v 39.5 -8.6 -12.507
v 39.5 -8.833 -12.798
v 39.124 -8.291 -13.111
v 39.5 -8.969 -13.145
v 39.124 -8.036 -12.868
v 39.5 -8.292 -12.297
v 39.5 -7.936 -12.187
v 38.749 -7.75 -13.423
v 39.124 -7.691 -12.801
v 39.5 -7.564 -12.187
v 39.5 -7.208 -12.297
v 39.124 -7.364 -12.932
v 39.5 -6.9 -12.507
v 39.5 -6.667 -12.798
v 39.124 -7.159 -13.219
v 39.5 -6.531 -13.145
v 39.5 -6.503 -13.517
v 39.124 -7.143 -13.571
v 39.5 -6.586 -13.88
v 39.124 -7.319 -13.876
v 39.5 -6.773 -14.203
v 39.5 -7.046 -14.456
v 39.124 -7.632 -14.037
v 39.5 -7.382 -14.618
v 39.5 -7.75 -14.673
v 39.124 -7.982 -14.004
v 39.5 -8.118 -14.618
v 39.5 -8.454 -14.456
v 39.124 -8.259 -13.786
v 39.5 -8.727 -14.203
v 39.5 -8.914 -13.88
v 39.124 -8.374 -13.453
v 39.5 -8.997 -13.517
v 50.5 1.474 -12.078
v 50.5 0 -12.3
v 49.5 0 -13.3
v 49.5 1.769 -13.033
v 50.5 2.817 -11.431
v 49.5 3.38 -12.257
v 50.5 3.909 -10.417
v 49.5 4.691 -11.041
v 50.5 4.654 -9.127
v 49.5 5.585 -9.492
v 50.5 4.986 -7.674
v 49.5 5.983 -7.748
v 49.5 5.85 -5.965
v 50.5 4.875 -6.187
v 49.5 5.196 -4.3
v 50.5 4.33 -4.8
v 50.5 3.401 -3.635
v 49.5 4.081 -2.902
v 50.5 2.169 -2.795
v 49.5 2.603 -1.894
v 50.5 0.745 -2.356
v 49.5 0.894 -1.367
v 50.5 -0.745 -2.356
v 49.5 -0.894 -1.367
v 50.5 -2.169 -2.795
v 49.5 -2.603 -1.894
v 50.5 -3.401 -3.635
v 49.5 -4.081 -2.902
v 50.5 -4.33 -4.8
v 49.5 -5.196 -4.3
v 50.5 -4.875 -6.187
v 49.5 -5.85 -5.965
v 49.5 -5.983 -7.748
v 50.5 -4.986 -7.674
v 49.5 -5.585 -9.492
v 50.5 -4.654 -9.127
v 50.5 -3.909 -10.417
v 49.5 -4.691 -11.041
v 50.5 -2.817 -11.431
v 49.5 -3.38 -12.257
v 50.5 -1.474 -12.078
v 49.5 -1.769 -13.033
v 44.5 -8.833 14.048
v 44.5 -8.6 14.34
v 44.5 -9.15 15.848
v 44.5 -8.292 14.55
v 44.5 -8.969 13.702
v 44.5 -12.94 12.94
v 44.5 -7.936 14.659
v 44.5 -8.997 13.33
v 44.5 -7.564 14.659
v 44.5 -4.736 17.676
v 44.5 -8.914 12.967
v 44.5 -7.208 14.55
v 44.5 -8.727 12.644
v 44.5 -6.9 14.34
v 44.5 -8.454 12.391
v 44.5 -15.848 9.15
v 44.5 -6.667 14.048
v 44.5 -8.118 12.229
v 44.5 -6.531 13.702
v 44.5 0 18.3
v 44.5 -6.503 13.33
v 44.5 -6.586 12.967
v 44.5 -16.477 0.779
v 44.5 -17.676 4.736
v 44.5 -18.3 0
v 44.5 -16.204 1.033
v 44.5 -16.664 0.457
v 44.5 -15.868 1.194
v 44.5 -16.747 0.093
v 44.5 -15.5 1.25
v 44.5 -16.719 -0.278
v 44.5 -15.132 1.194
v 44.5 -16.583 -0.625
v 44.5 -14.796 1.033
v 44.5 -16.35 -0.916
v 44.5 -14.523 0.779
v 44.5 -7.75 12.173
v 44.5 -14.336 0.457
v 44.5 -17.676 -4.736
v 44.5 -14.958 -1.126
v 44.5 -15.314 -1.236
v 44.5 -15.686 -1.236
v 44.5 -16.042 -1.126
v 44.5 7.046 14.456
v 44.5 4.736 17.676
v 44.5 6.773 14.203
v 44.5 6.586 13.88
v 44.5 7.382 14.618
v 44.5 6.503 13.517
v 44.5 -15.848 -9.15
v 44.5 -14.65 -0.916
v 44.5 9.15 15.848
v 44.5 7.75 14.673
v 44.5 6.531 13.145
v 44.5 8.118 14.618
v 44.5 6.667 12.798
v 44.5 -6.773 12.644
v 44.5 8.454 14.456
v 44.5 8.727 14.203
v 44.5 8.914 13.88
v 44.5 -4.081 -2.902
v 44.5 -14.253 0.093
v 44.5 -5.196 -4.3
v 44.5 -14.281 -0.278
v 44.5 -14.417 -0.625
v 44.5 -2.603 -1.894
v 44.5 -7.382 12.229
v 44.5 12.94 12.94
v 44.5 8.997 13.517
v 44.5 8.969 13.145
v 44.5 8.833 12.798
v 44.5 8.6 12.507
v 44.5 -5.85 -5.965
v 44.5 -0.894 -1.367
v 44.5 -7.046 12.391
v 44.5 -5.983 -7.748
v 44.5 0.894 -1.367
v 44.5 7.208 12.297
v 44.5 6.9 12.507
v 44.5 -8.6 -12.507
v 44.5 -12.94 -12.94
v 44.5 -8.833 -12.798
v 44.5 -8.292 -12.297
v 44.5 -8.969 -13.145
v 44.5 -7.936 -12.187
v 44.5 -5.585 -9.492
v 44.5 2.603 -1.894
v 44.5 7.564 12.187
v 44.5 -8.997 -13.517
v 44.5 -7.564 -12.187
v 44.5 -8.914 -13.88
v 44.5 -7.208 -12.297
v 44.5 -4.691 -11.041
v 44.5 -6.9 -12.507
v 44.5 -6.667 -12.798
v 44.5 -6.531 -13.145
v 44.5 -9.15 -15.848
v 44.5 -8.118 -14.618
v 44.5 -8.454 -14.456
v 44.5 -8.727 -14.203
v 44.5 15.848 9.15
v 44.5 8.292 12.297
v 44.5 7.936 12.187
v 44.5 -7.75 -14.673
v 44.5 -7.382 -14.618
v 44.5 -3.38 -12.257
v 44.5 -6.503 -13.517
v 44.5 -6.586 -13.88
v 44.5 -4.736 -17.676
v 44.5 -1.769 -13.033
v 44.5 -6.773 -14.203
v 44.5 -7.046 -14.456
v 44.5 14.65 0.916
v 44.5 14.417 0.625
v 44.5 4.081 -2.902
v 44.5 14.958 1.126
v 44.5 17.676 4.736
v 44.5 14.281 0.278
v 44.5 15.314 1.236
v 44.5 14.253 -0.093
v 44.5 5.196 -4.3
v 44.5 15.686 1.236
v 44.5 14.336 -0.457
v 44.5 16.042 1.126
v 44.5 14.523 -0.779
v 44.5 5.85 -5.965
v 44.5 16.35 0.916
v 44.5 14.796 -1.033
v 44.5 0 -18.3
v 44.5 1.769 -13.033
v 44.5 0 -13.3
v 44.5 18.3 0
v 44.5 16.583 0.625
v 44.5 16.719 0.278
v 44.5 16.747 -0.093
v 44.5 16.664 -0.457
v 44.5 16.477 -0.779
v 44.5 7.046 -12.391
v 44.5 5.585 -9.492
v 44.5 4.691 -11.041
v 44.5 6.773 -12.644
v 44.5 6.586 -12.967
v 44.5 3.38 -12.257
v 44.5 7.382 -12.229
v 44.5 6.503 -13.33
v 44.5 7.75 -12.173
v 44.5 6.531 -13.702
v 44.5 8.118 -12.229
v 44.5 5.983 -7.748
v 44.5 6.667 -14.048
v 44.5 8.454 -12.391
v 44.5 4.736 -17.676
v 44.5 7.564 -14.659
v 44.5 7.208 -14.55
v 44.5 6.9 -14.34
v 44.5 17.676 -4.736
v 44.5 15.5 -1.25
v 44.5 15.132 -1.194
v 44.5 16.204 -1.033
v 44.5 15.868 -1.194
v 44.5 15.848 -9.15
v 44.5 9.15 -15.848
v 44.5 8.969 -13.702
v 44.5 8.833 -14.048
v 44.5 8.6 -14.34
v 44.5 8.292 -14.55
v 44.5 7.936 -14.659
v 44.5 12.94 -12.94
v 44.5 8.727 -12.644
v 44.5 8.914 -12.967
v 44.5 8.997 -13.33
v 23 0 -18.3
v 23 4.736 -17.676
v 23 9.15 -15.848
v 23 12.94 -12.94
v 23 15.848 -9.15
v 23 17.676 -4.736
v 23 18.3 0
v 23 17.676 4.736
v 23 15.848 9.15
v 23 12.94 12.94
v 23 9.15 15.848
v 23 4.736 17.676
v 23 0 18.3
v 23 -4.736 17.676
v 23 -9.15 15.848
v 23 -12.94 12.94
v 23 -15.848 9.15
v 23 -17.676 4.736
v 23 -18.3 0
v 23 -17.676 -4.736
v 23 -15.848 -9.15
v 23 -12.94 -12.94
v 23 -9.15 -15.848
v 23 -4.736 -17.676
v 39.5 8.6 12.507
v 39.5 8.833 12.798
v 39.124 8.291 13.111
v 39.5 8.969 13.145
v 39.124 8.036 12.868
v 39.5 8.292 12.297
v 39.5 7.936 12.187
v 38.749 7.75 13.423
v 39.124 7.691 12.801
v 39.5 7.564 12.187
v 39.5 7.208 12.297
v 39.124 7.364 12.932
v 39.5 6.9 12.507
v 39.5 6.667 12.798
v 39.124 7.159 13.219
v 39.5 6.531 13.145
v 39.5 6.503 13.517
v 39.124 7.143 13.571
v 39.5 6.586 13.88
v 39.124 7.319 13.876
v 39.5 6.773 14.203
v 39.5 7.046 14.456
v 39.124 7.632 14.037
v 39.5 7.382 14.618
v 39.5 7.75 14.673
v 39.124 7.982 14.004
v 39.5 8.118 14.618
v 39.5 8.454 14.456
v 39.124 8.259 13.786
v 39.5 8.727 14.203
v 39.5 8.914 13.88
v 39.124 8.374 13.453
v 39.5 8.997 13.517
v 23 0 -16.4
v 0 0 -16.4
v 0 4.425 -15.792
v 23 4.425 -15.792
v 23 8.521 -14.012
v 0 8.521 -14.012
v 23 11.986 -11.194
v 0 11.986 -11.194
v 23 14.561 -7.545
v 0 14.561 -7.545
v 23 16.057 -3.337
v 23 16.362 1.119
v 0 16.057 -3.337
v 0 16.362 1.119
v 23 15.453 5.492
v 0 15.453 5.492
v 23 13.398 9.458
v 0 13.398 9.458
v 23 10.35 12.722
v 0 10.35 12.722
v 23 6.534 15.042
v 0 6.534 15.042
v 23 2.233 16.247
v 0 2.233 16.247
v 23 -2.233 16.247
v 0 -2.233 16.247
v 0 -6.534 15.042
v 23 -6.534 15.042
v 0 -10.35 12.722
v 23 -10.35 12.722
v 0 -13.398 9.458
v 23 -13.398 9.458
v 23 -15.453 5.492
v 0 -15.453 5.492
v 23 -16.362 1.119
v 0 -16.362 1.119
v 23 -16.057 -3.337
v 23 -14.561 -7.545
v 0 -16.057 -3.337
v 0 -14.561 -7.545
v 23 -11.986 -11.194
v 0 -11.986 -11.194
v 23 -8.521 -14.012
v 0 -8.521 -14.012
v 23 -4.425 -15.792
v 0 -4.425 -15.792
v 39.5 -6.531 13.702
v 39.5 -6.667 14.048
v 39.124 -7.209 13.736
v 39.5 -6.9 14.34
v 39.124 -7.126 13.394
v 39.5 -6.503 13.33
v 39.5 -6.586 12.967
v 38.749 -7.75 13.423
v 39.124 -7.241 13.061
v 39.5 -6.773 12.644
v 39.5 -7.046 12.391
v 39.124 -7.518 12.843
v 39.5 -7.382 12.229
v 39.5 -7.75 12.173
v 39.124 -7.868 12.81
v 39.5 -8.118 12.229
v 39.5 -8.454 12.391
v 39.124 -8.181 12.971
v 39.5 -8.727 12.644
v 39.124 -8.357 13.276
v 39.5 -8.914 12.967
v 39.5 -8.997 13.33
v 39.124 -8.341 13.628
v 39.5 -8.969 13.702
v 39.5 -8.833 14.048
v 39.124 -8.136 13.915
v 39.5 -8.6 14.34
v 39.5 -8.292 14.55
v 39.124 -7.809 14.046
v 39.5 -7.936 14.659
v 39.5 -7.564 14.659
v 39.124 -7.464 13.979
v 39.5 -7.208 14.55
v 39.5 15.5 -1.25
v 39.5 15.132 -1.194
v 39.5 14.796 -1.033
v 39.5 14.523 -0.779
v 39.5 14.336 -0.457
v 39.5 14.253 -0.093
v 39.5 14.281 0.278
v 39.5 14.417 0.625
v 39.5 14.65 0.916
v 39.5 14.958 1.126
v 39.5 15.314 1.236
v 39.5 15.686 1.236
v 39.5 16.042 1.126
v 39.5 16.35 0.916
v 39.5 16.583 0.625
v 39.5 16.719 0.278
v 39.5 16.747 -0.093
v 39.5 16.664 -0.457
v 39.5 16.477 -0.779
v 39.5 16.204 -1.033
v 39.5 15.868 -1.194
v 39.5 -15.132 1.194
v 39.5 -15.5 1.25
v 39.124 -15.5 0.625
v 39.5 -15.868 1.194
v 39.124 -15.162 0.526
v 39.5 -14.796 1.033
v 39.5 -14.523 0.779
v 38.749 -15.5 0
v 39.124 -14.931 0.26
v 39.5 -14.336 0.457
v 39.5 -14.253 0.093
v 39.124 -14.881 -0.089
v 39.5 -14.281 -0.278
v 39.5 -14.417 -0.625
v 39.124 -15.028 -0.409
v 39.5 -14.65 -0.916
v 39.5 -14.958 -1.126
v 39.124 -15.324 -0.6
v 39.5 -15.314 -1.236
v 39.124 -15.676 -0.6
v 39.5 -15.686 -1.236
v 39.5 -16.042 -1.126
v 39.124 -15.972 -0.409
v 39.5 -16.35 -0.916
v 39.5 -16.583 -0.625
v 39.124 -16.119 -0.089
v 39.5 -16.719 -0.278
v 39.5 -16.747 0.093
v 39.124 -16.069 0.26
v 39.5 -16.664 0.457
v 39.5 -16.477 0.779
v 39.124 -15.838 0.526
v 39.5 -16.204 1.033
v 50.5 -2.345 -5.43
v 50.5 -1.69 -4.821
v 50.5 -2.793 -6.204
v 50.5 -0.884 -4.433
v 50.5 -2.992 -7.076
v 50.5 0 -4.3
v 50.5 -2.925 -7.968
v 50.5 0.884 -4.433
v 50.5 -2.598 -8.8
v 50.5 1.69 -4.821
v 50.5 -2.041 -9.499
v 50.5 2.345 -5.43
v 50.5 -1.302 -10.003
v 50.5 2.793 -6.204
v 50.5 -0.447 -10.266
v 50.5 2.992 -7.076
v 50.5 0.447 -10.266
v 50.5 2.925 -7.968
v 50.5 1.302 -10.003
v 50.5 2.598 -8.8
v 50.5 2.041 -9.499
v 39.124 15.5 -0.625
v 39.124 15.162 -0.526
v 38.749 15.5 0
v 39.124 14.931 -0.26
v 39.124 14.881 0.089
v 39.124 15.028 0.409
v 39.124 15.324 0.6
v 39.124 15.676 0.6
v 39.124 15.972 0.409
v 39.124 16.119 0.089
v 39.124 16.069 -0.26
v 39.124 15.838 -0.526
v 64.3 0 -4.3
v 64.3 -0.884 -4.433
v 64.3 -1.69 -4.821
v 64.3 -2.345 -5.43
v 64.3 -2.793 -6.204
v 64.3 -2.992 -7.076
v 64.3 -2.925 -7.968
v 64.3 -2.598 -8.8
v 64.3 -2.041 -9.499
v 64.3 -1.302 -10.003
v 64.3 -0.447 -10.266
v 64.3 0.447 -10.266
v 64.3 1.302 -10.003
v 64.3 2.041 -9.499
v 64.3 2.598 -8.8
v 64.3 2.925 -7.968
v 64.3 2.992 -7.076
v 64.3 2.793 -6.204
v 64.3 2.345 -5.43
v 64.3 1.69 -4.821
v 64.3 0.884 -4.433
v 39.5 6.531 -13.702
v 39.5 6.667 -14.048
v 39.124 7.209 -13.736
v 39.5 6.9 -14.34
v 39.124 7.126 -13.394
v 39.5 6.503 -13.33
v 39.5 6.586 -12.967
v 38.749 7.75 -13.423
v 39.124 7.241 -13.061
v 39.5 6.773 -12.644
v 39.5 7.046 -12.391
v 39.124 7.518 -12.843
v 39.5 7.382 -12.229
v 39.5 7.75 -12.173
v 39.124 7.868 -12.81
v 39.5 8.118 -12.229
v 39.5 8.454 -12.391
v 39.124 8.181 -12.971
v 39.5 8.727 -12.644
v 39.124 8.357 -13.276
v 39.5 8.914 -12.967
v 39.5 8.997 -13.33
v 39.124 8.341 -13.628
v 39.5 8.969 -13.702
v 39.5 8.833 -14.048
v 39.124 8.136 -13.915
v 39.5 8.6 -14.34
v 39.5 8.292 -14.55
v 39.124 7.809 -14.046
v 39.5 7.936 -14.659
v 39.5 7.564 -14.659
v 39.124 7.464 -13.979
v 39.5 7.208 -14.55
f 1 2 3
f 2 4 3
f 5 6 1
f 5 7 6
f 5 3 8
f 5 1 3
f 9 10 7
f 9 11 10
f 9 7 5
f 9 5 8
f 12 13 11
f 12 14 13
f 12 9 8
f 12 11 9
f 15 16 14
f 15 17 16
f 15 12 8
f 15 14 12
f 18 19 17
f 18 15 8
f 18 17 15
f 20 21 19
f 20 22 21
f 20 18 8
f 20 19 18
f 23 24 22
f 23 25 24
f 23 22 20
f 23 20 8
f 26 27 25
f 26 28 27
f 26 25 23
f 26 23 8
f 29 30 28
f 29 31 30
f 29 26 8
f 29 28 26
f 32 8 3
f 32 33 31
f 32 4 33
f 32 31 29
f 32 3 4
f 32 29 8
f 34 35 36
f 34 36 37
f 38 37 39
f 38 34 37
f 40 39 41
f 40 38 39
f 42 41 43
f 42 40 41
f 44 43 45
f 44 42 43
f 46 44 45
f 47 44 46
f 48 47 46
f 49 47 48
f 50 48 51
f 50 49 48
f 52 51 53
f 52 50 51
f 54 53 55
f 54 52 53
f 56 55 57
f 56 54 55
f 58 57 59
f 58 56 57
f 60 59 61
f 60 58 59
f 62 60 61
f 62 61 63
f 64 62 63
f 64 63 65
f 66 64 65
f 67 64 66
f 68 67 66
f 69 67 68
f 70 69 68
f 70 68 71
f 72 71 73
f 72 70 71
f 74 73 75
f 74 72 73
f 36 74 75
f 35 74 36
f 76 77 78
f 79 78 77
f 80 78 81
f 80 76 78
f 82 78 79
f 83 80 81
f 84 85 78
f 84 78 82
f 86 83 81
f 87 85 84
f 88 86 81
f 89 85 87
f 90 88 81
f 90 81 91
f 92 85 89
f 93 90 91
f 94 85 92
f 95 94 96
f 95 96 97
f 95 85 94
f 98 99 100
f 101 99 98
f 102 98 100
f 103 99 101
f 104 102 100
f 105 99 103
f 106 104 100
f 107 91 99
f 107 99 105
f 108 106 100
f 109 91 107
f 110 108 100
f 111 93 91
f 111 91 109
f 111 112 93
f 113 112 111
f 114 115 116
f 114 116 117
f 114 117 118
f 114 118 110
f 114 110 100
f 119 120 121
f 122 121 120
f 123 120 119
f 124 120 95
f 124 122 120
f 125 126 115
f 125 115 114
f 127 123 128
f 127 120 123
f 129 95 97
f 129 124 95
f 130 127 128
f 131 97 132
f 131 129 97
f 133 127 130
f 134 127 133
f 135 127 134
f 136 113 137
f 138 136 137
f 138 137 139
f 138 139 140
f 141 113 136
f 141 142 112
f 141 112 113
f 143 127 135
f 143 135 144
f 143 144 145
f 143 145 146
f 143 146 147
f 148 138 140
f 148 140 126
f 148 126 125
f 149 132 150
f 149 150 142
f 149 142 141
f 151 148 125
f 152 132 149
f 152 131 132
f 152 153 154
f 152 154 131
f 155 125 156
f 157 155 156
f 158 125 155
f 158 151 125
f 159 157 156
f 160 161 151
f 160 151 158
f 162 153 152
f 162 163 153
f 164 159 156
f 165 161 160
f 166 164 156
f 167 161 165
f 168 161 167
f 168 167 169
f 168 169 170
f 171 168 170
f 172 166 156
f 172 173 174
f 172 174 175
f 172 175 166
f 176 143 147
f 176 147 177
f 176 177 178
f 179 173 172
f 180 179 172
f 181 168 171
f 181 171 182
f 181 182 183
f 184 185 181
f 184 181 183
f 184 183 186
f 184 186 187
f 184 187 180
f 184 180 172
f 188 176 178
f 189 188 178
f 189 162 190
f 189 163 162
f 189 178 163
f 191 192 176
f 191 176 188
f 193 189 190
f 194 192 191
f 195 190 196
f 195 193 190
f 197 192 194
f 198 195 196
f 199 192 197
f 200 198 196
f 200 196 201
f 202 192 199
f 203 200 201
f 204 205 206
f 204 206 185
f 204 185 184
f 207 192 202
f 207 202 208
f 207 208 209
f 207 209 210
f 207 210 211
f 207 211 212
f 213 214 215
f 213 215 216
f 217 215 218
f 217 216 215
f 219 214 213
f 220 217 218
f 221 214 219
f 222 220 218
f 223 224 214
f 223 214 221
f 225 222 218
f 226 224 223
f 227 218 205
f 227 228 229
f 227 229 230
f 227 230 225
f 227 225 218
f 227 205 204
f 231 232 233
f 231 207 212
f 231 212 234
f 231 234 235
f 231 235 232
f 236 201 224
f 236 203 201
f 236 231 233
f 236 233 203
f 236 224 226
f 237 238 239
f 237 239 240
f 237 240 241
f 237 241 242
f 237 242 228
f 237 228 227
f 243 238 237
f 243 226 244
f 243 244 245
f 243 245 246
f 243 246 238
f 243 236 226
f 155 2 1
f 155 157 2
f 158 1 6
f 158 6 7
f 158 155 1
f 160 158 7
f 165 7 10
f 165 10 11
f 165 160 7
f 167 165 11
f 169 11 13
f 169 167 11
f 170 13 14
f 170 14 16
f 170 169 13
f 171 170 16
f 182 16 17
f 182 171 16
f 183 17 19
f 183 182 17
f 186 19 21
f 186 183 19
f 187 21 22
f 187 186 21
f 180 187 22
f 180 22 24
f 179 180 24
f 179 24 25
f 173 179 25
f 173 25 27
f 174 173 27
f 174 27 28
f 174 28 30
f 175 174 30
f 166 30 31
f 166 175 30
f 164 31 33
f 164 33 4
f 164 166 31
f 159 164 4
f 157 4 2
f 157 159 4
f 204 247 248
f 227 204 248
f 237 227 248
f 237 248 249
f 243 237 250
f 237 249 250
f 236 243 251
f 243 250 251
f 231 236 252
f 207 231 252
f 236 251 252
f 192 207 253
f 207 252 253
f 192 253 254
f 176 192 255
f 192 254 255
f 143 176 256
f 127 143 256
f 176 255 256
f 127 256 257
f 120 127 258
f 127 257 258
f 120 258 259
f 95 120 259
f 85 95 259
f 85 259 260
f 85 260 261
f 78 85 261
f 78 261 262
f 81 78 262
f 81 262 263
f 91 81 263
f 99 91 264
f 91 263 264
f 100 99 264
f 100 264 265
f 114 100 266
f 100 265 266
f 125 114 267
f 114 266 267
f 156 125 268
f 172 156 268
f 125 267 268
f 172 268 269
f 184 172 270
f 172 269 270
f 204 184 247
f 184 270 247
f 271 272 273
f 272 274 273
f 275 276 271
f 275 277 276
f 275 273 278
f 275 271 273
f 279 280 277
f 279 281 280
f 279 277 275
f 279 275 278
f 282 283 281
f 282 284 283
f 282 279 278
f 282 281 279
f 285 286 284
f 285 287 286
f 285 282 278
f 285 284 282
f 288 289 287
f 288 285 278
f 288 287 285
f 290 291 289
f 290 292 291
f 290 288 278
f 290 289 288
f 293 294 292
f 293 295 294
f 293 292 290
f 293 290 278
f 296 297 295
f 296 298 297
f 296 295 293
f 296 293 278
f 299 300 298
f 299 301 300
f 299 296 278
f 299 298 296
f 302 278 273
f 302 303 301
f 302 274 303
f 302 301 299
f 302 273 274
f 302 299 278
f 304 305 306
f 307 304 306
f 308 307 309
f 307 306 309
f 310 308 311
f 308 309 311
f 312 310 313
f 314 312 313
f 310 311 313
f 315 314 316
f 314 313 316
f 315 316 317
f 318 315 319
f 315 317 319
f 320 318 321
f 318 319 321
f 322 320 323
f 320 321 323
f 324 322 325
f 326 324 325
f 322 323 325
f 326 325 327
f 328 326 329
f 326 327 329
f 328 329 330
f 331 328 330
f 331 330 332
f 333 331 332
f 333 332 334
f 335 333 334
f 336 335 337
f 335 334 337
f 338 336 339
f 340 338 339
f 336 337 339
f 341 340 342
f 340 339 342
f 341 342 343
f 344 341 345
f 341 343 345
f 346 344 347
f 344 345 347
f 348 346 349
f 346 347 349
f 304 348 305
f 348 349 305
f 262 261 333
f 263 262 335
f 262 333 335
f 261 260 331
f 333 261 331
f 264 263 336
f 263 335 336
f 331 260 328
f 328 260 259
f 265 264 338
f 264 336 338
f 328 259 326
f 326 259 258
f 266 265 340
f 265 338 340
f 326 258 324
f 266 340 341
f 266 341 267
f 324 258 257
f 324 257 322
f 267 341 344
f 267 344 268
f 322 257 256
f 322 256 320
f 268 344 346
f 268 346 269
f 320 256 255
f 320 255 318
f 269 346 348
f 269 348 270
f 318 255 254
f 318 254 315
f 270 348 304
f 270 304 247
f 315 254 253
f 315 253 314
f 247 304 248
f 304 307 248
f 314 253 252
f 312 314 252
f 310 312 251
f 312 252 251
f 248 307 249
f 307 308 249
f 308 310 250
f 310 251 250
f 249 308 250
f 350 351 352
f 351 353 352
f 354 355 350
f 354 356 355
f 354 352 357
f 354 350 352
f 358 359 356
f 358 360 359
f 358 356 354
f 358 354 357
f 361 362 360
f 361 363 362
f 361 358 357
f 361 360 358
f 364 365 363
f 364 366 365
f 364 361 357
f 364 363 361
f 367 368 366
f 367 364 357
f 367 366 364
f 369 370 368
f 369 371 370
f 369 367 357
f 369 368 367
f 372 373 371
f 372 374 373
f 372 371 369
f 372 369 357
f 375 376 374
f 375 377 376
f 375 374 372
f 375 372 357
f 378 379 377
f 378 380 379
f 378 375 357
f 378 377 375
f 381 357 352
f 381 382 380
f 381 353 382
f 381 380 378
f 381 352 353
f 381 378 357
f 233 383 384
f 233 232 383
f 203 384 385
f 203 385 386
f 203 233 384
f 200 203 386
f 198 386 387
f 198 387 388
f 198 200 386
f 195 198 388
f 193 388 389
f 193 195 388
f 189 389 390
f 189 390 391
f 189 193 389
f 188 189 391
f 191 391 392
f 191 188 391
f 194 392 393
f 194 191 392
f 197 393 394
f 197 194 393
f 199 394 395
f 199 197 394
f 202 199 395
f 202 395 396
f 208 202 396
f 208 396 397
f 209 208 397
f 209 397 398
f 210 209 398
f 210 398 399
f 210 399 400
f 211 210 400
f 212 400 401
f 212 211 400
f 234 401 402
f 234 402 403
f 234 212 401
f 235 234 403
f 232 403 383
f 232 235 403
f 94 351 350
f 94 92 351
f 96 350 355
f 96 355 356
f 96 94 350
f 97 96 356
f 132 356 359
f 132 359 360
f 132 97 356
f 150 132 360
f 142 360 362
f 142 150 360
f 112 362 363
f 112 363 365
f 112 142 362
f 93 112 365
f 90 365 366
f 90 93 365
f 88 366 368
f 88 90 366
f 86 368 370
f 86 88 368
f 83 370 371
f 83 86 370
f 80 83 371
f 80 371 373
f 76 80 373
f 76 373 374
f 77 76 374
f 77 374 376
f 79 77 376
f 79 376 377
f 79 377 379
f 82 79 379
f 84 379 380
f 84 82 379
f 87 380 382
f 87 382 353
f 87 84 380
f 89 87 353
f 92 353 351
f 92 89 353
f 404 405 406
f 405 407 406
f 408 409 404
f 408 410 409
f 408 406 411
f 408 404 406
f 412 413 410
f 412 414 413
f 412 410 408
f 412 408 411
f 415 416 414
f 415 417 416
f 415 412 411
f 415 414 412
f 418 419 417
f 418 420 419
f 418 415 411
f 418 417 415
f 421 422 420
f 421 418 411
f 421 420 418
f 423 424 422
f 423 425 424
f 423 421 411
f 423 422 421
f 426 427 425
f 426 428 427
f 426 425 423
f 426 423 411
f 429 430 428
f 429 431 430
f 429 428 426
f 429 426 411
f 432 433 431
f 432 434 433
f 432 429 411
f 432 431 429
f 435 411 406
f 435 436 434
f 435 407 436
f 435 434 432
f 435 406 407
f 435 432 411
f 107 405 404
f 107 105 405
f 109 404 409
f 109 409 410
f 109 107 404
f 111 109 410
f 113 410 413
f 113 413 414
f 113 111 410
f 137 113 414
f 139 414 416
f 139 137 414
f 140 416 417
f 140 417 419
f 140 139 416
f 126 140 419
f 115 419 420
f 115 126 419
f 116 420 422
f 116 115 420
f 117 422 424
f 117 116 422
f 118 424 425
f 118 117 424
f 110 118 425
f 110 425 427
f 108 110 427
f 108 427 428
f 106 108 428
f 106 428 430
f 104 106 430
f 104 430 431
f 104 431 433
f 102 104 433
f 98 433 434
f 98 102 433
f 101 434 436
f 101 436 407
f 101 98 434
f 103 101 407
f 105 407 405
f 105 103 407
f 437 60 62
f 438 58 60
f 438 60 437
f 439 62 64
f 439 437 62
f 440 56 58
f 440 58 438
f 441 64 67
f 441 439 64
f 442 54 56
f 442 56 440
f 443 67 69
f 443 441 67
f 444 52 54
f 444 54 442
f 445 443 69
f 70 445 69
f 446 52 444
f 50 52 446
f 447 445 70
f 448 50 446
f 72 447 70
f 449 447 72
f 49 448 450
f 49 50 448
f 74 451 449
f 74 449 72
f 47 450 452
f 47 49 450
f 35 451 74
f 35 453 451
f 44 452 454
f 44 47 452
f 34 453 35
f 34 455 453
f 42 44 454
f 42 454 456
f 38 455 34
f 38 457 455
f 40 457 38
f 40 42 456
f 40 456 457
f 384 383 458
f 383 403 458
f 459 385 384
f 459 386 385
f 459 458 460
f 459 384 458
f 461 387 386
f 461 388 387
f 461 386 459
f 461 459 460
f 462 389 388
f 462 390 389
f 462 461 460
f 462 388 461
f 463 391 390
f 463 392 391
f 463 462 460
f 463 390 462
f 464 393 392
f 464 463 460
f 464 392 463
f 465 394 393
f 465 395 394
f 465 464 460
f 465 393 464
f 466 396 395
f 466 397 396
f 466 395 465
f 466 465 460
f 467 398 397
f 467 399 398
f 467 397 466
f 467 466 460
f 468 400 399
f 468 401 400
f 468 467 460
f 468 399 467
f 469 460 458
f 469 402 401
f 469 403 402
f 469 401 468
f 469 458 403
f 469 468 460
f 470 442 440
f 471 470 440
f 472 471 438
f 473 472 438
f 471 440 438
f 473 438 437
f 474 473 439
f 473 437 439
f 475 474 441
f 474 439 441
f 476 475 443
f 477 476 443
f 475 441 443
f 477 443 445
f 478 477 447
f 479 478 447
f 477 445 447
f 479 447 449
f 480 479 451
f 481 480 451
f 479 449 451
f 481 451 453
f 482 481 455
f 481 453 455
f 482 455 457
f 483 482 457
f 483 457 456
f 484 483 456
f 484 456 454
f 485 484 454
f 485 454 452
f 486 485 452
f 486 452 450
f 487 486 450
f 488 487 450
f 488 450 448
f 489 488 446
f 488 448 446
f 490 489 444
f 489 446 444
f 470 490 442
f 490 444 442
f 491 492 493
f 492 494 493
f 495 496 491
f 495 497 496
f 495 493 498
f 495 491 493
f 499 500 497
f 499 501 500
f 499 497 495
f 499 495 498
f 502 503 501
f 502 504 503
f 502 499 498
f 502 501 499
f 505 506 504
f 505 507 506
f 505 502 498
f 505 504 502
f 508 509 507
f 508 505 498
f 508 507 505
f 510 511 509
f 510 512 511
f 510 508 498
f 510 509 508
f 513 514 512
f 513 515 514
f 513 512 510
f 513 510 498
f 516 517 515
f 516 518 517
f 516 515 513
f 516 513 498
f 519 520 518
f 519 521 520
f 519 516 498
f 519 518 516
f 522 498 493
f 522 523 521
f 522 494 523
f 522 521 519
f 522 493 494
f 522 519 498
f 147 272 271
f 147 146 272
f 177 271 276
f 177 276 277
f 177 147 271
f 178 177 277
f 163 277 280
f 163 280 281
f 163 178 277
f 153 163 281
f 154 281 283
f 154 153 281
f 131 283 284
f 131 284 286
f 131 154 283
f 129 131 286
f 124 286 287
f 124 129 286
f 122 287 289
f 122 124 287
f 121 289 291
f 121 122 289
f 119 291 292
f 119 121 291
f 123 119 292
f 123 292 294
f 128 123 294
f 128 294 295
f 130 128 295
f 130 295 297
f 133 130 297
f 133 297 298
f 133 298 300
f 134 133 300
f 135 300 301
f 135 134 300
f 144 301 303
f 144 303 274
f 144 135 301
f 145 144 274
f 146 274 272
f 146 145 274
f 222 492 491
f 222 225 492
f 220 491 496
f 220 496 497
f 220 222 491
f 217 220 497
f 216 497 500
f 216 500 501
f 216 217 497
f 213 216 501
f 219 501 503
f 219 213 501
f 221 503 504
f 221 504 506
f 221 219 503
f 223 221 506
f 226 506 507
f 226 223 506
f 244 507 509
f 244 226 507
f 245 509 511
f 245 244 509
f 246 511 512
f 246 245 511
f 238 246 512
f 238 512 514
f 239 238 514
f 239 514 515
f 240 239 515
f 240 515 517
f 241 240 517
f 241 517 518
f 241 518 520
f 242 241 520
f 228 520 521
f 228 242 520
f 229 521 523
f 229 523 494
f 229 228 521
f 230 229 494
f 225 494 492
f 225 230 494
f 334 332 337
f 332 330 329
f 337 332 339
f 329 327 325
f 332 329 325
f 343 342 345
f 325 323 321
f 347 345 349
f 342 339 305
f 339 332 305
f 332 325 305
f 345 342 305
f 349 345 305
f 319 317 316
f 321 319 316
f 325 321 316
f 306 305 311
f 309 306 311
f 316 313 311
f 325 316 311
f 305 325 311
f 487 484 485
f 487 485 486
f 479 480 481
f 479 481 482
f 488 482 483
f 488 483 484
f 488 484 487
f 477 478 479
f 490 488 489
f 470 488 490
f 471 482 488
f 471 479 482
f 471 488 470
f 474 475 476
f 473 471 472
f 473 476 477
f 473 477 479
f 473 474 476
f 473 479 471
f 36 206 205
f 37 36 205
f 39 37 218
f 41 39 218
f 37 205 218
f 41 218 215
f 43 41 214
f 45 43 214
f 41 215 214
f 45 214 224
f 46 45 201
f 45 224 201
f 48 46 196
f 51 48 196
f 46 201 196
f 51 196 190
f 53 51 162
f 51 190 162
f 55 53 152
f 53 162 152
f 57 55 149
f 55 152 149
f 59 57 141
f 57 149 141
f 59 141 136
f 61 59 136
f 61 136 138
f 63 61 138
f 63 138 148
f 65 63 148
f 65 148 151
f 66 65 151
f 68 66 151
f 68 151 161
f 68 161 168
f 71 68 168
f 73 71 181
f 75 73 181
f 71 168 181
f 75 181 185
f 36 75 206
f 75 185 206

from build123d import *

# Parameters (mm, degrees)
SKETCH_1_R               = 16.4
EXTRUDE_1_DEPTH          = 23
SKETCH_2_R               = 18.3
EXTRUDE_2_DEPTH          = 21.5
SKETCH_3_R               = 6
EXTRUDE_3_DEPTH          = 6
SKETCH_4_R               = 3
EXTRUDE_4_DEPTH          = 13.8
PATTERN_CIRCULAR_1_COUNT = 6
CHAMFER_1_SIZE           = 1


with BuildPart() as part:
    # 草图1 → 凸台-拉伸1 (new body)
    with BuildSketch(Plane(origin=(0, 0, 0), x_dir=(0, 0, -1), z_dir=(1, 0, 0))):
        Circle(SKETCH_1_R)
    extrude(amount=EXTRUDE_1_DEPTH)

    # 草图2 → 凸台-拉伸2 (add)
    with BuildSketch(Plane(origin=(23, 0, 0), x_dir=(0, 0, -1), z_dir=(1, 0, 0))):
        Circle(SKETCH_2_R)
    extrude(amount=EXTRUDE_2_DEPTH)

    # 草图3 → 凸台-拉伸3 (add)
    with BuildSketch(Plane(origin=(44.5, 0, 0), x_dir=(0, 0, -1), z_dir=(1, 0, 0))):
        with Locations((7.3, 0)):
            Circle(SKETCH_3_R)
    extrude(amount=EXTRUDE_3_DEPTH)

    # 草图4 → 凸台-拉伸4 (add)
    with BuildSketch(Plane(origin=(50.5, 0, 0), x_dir=(0, 0, -1), z_dir=(1, 0, 0))):
        with Locations(Location((7.3, 0, 0), (0, 0, 180))):
            Circle(SKETCH_4_R)
    extrude(amount=EXTRUDE_4_DEPTH)

    # 草图7 → M3 螺纹孔1 (revolve, cut)
    with BuildSketch(Plane(origin=(44.5, 15.5, 0), x_dir=(0, 0, -1), z_dir=(0, 1, 0))):
        Polygon((0, 0), (0, 5.751075774), (1.25, 5), (1.25, 0), align=None)
    hole_wizard_m3_1 = revolve(axis=Axis((50.85, 15.5, 0), (-1, 0, 0)), mode=Mode.SUBTRACT)

    # 阵列(圆周)1: M3 螺纹孔1 ×6 about axis
    pattern_circular_1_axis = Axis((0, 0, 0), (1, 0, 0))
    for i in range(1, PATTERN_CIRCULAR_1_COUNT):
        add(hole_wizard_m3_1.rotate(pattern_circular_1_axis, i * 360 / PATTERN_CIRCULAR_1_COUNT), mode=Mode.SUBTRACT)

    # 倒角1
    chamfer_1_edges = [part.edges().sort_by_distance(p)[0] for p in [
        (50.5, 0, -1.3),
    ]]
    chamfer(chamfer_1_edges, length=CHAMFER_1_SIZE)


solid = part.part
